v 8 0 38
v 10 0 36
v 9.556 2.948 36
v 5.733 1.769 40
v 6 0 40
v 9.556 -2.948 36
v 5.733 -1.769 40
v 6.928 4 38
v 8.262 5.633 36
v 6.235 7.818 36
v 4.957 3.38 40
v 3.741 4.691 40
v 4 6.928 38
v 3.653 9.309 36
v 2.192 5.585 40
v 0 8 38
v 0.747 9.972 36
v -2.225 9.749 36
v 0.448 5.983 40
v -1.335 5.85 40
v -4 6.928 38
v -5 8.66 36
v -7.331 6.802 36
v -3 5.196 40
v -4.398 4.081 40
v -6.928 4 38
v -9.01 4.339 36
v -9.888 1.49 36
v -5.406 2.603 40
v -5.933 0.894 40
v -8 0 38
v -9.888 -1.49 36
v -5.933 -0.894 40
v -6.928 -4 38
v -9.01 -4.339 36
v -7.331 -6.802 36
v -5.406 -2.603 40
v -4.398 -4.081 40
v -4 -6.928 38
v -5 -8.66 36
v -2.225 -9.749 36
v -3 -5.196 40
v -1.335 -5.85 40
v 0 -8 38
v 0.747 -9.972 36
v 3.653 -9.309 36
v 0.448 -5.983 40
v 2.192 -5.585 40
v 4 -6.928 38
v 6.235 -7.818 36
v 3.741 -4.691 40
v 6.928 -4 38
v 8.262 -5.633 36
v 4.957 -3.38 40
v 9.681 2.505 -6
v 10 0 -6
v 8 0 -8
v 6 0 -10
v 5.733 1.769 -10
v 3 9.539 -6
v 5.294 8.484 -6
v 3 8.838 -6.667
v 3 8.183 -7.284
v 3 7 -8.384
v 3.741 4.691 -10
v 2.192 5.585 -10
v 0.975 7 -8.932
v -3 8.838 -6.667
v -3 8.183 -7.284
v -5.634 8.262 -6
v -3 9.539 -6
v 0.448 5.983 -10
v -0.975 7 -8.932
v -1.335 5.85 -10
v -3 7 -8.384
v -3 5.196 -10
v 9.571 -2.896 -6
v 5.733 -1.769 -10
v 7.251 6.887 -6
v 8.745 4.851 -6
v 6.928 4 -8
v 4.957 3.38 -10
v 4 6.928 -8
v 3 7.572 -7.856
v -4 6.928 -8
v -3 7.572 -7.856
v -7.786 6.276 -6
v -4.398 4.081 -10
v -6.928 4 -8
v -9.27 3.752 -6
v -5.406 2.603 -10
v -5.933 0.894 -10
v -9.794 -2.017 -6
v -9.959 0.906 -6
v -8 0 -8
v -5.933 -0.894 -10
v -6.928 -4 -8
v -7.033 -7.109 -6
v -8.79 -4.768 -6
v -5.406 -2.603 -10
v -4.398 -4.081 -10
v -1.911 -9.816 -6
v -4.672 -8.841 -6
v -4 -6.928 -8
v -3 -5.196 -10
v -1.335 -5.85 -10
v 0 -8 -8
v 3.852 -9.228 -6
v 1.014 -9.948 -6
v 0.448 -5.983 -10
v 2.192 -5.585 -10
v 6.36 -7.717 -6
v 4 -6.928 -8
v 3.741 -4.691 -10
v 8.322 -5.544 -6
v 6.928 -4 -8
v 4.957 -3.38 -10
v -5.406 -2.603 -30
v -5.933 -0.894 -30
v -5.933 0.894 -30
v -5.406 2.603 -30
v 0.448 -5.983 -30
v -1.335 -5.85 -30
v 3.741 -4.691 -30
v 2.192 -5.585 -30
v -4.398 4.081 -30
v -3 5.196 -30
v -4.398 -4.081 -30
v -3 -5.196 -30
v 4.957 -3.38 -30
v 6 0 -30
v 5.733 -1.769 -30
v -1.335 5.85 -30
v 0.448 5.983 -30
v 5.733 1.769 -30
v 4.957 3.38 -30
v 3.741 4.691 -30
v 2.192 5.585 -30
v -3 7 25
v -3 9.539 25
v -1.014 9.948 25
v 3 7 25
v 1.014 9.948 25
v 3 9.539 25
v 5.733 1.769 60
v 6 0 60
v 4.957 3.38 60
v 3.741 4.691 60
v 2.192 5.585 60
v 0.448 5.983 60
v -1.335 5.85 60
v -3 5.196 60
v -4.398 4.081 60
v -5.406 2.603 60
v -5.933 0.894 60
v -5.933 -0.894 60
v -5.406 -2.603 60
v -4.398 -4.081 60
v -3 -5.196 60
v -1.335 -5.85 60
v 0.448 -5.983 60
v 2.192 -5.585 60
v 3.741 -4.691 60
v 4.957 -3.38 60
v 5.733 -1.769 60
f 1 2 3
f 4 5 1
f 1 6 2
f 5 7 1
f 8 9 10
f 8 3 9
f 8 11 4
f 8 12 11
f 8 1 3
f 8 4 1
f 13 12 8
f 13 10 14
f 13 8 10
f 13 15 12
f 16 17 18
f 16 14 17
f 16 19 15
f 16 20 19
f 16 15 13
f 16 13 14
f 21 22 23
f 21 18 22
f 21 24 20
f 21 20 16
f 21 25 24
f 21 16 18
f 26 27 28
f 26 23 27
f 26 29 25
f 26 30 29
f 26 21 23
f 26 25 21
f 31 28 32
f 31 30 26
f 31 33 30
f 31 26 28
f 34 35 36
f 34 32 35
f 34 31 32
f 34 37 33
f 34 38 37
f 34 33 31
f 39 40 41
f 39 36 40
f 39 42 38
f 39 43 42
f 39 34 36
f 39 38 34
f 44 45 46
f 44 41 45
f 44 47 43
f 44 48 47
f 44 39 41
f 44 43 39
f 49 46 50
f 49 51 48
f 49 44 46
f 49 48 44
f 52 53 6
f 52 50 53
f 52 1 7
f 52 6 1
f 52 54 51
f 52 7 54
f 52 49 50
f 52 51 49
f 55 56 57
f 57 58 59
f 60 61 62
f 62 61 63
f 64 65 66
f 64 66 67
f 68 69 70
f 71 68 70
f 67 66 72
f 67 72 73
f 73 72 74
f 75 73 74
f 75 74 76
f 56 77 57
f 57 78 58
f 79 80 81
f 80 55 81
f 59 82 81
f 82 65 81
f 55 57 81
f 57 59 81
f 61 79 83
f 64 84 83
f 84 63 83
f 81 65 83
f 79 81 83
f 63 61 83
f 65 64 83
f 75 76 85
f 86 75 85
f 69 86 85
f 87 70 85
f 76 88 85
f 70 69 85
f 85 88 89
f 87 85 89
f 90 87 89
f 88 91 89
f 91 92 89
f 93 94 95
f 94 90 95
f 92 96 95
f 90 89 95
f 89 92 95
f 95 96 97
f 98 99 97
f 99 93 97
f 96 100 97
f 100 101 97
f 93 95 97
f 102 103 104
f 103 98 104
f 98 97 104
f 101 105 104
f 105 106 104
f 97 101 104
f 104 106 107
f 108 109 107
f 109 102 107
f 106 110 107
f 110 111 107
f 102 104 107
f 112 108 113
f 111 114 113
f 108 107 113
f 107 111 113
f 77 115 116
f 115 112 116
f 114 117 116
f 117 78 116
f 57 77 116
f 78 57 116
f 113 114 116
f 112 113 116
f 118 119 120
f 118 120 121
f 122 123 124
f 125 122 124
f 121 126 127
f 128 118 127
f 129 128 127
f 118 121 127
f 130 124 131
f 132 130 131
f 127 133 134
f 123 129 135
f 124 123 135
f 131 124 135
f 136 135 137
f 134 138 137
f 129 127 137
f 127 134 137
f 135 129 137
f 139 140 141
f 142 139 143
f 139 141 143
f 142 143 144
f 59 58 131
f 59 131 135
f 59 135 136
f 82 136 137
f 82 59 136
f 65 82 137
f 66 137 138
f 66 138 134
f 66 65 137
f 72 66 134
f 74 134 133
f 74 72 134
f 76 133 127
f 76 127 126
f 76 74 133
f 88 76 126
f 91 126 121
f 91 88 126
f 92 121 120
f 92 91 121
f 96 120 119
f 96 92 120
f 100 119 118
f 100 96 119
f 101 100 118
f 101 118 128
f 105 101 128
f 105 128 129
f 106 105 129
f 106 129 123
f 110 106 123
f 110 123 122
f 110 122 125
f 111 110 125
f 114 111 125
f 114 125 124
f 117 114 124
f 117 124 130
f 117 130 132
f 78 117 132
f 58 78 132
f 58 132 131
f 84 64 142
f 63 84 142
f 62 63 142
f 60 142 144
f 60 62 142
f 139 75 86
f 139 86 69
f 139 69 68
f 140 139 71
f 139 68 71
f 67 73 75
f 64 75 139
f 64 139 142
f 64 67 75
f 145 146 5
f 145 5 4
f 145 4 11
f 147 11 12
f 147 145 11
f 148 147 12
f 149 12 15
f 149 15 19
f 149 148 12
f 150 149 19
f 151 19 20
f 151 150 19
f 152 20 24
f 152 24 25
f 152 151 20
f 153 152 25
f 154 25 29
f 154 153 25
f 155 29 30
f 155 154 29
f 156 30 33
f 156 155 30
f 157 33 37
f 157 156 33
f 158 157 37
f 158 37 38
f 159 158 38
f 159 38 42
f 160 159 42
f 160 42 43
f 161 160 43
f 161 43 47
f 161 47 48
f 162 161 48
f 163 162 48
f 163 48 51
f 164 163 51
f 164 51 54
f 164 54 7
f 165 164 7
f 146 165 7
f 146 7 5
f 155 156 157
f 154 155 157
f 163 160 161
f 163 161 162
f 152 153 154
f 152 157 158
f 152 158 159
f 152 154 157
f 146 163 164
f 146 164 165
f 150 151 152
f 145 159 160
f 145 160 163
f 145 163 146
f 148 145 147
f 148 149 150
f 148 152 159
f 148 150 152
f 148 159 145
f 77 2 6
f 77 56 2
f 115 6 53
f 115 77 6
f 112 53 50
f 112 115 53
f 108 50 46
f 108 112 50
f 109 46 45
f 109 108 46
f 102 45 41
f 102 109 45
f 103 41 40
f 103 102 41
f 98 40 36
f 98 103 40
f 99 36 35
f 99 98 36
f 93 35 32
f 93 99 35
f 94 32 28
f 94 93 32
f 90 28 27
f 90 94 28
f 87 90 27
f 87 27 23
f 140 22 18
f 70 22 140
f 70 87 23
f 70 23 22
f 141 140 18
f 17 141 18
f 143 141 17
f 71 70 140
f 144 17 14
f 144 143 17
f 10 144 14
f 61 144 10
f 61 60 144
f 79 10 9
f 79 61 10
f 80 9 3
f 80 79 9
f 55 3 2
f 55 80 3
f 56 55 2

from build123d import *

# Parameters (mm, degrees)
SKETCH2_R               = 10
BOSS_EXTRUDE1_DEPTH     = 30
SKETCH5_R               = 6
BOSS_EXTRUDE3_DEPTH     = 30
CHAMFER2_SIZE           = 10
CUT_EXTRUDE1_DEPTH      = 25
CUT_EXTRUDE1_DEPTH_BACK = 34.166247904
SKETCH3_W               = 6
SKETCH3_H               = 6
BOSS_EXTRUDE4_START     = 60
SKETCH5_3_R             = 6
BOSS_EXTRUDE4_DEPTH     = 30
CHAMFER3_SIZE           = 10


with BuildPart() as part:
    # Sketch2 → Boss-Extrude1 (new body)
    with BuildSketch(Plane.XY):
        Circle(SKETCH2_R)
    extrude(amount=BOSS_EXTRUDE1_DEPTH)

    # Sketch5 → Boss-Extrude3 (add)
    with BuildSketch(Plane.XY):
        Circle(SKETCH5_R)
    extrude(amount=-BOSS_EXTRUDE3_DEPTH)

    # Chamfer2
    # the kernel refuses this chamfer: 10 mm, written as the material it adds along each edge
    with BuildSketch(Plane(origin=(0, 0, 0), x_dir=(1, 0, 0), z_dir=(0, -1, 0))) as chamfer2_piece_1_section:
        Polygon((6 + CHAMFER2_SIZE, 0), (6, -CHAMFER2_SIZE), (6, 0), align=None)
    chamfer2_piece_1 = revolve(axis=Axis((0, 0, 0), (0, 0, 1)), mode=Mode.PRIVATE)
    chamfer2_piece_1 = chamfer2_piece_1 & Plane(origin=(0, 0, -8.05698811), x_dir=(1, 0, 0), z_dir=(0, 0, -1)) * Cylinder(10, 64, mode=Mode.PRIVATE)
    add(chamfer2_piece_1)

    # Sketch3 → Cut-Extrude1 (cut, two sides: drawn at the far end of the back side and taken through both)
    with BuildSketch(Plane.XY.offset(-CUT_EXTRUDE1_DEPTH_BACK)):
        with Locations((0, 10)):
            Rectangle(SKETCH3_W, SKETCH3_H)
    extrude(amount=CUT_EXTRUDE1_DEPTH + CUT_EXTRUDE1_DEPTH_BACK, mode=Mode.SUBTRACT)

    # Sketch5<3> → Boss-Extrude4 (add)
    with BuildSketch(Plane.XY.offset(BOSS_EXTRUDE4_START)):
        Circle(SKETCH5_3_R)
    extrude(amount=-BOSS_EXTRUDE4_DEPTH)

    # Chamfer3
    # the kernel refuses this chamfer: 10 mm, written as the material it adds along each edge
    with BuildSketch(Plane(origin=(0, 0, 30), x_dir=(1, 0, 0), z_dir=(0, -1, 0))) as chamfer3_piece_1_section:
        Polygon((6 + CHAMFER3_SIZE, 0), (6, CHAMFER3_SIZE), (6, 0), align=None)
    chamfer3_piece_1 = revolve(axis=Axis((0, 0, 30), (0, 0, 1)), mode=Mode.PRIVATE)
    chamfer3_piece_1 = chamfer3_piece_1 & Plane(origin=(0, 0, 38.05698811), x_dir=(1, 0, 0), z_dir=(0, 0, -1)) * Cylinder(10, 64, mode=Mode.PRIVATE)
    add(chamfer3_piece_1)


solid = part.part
